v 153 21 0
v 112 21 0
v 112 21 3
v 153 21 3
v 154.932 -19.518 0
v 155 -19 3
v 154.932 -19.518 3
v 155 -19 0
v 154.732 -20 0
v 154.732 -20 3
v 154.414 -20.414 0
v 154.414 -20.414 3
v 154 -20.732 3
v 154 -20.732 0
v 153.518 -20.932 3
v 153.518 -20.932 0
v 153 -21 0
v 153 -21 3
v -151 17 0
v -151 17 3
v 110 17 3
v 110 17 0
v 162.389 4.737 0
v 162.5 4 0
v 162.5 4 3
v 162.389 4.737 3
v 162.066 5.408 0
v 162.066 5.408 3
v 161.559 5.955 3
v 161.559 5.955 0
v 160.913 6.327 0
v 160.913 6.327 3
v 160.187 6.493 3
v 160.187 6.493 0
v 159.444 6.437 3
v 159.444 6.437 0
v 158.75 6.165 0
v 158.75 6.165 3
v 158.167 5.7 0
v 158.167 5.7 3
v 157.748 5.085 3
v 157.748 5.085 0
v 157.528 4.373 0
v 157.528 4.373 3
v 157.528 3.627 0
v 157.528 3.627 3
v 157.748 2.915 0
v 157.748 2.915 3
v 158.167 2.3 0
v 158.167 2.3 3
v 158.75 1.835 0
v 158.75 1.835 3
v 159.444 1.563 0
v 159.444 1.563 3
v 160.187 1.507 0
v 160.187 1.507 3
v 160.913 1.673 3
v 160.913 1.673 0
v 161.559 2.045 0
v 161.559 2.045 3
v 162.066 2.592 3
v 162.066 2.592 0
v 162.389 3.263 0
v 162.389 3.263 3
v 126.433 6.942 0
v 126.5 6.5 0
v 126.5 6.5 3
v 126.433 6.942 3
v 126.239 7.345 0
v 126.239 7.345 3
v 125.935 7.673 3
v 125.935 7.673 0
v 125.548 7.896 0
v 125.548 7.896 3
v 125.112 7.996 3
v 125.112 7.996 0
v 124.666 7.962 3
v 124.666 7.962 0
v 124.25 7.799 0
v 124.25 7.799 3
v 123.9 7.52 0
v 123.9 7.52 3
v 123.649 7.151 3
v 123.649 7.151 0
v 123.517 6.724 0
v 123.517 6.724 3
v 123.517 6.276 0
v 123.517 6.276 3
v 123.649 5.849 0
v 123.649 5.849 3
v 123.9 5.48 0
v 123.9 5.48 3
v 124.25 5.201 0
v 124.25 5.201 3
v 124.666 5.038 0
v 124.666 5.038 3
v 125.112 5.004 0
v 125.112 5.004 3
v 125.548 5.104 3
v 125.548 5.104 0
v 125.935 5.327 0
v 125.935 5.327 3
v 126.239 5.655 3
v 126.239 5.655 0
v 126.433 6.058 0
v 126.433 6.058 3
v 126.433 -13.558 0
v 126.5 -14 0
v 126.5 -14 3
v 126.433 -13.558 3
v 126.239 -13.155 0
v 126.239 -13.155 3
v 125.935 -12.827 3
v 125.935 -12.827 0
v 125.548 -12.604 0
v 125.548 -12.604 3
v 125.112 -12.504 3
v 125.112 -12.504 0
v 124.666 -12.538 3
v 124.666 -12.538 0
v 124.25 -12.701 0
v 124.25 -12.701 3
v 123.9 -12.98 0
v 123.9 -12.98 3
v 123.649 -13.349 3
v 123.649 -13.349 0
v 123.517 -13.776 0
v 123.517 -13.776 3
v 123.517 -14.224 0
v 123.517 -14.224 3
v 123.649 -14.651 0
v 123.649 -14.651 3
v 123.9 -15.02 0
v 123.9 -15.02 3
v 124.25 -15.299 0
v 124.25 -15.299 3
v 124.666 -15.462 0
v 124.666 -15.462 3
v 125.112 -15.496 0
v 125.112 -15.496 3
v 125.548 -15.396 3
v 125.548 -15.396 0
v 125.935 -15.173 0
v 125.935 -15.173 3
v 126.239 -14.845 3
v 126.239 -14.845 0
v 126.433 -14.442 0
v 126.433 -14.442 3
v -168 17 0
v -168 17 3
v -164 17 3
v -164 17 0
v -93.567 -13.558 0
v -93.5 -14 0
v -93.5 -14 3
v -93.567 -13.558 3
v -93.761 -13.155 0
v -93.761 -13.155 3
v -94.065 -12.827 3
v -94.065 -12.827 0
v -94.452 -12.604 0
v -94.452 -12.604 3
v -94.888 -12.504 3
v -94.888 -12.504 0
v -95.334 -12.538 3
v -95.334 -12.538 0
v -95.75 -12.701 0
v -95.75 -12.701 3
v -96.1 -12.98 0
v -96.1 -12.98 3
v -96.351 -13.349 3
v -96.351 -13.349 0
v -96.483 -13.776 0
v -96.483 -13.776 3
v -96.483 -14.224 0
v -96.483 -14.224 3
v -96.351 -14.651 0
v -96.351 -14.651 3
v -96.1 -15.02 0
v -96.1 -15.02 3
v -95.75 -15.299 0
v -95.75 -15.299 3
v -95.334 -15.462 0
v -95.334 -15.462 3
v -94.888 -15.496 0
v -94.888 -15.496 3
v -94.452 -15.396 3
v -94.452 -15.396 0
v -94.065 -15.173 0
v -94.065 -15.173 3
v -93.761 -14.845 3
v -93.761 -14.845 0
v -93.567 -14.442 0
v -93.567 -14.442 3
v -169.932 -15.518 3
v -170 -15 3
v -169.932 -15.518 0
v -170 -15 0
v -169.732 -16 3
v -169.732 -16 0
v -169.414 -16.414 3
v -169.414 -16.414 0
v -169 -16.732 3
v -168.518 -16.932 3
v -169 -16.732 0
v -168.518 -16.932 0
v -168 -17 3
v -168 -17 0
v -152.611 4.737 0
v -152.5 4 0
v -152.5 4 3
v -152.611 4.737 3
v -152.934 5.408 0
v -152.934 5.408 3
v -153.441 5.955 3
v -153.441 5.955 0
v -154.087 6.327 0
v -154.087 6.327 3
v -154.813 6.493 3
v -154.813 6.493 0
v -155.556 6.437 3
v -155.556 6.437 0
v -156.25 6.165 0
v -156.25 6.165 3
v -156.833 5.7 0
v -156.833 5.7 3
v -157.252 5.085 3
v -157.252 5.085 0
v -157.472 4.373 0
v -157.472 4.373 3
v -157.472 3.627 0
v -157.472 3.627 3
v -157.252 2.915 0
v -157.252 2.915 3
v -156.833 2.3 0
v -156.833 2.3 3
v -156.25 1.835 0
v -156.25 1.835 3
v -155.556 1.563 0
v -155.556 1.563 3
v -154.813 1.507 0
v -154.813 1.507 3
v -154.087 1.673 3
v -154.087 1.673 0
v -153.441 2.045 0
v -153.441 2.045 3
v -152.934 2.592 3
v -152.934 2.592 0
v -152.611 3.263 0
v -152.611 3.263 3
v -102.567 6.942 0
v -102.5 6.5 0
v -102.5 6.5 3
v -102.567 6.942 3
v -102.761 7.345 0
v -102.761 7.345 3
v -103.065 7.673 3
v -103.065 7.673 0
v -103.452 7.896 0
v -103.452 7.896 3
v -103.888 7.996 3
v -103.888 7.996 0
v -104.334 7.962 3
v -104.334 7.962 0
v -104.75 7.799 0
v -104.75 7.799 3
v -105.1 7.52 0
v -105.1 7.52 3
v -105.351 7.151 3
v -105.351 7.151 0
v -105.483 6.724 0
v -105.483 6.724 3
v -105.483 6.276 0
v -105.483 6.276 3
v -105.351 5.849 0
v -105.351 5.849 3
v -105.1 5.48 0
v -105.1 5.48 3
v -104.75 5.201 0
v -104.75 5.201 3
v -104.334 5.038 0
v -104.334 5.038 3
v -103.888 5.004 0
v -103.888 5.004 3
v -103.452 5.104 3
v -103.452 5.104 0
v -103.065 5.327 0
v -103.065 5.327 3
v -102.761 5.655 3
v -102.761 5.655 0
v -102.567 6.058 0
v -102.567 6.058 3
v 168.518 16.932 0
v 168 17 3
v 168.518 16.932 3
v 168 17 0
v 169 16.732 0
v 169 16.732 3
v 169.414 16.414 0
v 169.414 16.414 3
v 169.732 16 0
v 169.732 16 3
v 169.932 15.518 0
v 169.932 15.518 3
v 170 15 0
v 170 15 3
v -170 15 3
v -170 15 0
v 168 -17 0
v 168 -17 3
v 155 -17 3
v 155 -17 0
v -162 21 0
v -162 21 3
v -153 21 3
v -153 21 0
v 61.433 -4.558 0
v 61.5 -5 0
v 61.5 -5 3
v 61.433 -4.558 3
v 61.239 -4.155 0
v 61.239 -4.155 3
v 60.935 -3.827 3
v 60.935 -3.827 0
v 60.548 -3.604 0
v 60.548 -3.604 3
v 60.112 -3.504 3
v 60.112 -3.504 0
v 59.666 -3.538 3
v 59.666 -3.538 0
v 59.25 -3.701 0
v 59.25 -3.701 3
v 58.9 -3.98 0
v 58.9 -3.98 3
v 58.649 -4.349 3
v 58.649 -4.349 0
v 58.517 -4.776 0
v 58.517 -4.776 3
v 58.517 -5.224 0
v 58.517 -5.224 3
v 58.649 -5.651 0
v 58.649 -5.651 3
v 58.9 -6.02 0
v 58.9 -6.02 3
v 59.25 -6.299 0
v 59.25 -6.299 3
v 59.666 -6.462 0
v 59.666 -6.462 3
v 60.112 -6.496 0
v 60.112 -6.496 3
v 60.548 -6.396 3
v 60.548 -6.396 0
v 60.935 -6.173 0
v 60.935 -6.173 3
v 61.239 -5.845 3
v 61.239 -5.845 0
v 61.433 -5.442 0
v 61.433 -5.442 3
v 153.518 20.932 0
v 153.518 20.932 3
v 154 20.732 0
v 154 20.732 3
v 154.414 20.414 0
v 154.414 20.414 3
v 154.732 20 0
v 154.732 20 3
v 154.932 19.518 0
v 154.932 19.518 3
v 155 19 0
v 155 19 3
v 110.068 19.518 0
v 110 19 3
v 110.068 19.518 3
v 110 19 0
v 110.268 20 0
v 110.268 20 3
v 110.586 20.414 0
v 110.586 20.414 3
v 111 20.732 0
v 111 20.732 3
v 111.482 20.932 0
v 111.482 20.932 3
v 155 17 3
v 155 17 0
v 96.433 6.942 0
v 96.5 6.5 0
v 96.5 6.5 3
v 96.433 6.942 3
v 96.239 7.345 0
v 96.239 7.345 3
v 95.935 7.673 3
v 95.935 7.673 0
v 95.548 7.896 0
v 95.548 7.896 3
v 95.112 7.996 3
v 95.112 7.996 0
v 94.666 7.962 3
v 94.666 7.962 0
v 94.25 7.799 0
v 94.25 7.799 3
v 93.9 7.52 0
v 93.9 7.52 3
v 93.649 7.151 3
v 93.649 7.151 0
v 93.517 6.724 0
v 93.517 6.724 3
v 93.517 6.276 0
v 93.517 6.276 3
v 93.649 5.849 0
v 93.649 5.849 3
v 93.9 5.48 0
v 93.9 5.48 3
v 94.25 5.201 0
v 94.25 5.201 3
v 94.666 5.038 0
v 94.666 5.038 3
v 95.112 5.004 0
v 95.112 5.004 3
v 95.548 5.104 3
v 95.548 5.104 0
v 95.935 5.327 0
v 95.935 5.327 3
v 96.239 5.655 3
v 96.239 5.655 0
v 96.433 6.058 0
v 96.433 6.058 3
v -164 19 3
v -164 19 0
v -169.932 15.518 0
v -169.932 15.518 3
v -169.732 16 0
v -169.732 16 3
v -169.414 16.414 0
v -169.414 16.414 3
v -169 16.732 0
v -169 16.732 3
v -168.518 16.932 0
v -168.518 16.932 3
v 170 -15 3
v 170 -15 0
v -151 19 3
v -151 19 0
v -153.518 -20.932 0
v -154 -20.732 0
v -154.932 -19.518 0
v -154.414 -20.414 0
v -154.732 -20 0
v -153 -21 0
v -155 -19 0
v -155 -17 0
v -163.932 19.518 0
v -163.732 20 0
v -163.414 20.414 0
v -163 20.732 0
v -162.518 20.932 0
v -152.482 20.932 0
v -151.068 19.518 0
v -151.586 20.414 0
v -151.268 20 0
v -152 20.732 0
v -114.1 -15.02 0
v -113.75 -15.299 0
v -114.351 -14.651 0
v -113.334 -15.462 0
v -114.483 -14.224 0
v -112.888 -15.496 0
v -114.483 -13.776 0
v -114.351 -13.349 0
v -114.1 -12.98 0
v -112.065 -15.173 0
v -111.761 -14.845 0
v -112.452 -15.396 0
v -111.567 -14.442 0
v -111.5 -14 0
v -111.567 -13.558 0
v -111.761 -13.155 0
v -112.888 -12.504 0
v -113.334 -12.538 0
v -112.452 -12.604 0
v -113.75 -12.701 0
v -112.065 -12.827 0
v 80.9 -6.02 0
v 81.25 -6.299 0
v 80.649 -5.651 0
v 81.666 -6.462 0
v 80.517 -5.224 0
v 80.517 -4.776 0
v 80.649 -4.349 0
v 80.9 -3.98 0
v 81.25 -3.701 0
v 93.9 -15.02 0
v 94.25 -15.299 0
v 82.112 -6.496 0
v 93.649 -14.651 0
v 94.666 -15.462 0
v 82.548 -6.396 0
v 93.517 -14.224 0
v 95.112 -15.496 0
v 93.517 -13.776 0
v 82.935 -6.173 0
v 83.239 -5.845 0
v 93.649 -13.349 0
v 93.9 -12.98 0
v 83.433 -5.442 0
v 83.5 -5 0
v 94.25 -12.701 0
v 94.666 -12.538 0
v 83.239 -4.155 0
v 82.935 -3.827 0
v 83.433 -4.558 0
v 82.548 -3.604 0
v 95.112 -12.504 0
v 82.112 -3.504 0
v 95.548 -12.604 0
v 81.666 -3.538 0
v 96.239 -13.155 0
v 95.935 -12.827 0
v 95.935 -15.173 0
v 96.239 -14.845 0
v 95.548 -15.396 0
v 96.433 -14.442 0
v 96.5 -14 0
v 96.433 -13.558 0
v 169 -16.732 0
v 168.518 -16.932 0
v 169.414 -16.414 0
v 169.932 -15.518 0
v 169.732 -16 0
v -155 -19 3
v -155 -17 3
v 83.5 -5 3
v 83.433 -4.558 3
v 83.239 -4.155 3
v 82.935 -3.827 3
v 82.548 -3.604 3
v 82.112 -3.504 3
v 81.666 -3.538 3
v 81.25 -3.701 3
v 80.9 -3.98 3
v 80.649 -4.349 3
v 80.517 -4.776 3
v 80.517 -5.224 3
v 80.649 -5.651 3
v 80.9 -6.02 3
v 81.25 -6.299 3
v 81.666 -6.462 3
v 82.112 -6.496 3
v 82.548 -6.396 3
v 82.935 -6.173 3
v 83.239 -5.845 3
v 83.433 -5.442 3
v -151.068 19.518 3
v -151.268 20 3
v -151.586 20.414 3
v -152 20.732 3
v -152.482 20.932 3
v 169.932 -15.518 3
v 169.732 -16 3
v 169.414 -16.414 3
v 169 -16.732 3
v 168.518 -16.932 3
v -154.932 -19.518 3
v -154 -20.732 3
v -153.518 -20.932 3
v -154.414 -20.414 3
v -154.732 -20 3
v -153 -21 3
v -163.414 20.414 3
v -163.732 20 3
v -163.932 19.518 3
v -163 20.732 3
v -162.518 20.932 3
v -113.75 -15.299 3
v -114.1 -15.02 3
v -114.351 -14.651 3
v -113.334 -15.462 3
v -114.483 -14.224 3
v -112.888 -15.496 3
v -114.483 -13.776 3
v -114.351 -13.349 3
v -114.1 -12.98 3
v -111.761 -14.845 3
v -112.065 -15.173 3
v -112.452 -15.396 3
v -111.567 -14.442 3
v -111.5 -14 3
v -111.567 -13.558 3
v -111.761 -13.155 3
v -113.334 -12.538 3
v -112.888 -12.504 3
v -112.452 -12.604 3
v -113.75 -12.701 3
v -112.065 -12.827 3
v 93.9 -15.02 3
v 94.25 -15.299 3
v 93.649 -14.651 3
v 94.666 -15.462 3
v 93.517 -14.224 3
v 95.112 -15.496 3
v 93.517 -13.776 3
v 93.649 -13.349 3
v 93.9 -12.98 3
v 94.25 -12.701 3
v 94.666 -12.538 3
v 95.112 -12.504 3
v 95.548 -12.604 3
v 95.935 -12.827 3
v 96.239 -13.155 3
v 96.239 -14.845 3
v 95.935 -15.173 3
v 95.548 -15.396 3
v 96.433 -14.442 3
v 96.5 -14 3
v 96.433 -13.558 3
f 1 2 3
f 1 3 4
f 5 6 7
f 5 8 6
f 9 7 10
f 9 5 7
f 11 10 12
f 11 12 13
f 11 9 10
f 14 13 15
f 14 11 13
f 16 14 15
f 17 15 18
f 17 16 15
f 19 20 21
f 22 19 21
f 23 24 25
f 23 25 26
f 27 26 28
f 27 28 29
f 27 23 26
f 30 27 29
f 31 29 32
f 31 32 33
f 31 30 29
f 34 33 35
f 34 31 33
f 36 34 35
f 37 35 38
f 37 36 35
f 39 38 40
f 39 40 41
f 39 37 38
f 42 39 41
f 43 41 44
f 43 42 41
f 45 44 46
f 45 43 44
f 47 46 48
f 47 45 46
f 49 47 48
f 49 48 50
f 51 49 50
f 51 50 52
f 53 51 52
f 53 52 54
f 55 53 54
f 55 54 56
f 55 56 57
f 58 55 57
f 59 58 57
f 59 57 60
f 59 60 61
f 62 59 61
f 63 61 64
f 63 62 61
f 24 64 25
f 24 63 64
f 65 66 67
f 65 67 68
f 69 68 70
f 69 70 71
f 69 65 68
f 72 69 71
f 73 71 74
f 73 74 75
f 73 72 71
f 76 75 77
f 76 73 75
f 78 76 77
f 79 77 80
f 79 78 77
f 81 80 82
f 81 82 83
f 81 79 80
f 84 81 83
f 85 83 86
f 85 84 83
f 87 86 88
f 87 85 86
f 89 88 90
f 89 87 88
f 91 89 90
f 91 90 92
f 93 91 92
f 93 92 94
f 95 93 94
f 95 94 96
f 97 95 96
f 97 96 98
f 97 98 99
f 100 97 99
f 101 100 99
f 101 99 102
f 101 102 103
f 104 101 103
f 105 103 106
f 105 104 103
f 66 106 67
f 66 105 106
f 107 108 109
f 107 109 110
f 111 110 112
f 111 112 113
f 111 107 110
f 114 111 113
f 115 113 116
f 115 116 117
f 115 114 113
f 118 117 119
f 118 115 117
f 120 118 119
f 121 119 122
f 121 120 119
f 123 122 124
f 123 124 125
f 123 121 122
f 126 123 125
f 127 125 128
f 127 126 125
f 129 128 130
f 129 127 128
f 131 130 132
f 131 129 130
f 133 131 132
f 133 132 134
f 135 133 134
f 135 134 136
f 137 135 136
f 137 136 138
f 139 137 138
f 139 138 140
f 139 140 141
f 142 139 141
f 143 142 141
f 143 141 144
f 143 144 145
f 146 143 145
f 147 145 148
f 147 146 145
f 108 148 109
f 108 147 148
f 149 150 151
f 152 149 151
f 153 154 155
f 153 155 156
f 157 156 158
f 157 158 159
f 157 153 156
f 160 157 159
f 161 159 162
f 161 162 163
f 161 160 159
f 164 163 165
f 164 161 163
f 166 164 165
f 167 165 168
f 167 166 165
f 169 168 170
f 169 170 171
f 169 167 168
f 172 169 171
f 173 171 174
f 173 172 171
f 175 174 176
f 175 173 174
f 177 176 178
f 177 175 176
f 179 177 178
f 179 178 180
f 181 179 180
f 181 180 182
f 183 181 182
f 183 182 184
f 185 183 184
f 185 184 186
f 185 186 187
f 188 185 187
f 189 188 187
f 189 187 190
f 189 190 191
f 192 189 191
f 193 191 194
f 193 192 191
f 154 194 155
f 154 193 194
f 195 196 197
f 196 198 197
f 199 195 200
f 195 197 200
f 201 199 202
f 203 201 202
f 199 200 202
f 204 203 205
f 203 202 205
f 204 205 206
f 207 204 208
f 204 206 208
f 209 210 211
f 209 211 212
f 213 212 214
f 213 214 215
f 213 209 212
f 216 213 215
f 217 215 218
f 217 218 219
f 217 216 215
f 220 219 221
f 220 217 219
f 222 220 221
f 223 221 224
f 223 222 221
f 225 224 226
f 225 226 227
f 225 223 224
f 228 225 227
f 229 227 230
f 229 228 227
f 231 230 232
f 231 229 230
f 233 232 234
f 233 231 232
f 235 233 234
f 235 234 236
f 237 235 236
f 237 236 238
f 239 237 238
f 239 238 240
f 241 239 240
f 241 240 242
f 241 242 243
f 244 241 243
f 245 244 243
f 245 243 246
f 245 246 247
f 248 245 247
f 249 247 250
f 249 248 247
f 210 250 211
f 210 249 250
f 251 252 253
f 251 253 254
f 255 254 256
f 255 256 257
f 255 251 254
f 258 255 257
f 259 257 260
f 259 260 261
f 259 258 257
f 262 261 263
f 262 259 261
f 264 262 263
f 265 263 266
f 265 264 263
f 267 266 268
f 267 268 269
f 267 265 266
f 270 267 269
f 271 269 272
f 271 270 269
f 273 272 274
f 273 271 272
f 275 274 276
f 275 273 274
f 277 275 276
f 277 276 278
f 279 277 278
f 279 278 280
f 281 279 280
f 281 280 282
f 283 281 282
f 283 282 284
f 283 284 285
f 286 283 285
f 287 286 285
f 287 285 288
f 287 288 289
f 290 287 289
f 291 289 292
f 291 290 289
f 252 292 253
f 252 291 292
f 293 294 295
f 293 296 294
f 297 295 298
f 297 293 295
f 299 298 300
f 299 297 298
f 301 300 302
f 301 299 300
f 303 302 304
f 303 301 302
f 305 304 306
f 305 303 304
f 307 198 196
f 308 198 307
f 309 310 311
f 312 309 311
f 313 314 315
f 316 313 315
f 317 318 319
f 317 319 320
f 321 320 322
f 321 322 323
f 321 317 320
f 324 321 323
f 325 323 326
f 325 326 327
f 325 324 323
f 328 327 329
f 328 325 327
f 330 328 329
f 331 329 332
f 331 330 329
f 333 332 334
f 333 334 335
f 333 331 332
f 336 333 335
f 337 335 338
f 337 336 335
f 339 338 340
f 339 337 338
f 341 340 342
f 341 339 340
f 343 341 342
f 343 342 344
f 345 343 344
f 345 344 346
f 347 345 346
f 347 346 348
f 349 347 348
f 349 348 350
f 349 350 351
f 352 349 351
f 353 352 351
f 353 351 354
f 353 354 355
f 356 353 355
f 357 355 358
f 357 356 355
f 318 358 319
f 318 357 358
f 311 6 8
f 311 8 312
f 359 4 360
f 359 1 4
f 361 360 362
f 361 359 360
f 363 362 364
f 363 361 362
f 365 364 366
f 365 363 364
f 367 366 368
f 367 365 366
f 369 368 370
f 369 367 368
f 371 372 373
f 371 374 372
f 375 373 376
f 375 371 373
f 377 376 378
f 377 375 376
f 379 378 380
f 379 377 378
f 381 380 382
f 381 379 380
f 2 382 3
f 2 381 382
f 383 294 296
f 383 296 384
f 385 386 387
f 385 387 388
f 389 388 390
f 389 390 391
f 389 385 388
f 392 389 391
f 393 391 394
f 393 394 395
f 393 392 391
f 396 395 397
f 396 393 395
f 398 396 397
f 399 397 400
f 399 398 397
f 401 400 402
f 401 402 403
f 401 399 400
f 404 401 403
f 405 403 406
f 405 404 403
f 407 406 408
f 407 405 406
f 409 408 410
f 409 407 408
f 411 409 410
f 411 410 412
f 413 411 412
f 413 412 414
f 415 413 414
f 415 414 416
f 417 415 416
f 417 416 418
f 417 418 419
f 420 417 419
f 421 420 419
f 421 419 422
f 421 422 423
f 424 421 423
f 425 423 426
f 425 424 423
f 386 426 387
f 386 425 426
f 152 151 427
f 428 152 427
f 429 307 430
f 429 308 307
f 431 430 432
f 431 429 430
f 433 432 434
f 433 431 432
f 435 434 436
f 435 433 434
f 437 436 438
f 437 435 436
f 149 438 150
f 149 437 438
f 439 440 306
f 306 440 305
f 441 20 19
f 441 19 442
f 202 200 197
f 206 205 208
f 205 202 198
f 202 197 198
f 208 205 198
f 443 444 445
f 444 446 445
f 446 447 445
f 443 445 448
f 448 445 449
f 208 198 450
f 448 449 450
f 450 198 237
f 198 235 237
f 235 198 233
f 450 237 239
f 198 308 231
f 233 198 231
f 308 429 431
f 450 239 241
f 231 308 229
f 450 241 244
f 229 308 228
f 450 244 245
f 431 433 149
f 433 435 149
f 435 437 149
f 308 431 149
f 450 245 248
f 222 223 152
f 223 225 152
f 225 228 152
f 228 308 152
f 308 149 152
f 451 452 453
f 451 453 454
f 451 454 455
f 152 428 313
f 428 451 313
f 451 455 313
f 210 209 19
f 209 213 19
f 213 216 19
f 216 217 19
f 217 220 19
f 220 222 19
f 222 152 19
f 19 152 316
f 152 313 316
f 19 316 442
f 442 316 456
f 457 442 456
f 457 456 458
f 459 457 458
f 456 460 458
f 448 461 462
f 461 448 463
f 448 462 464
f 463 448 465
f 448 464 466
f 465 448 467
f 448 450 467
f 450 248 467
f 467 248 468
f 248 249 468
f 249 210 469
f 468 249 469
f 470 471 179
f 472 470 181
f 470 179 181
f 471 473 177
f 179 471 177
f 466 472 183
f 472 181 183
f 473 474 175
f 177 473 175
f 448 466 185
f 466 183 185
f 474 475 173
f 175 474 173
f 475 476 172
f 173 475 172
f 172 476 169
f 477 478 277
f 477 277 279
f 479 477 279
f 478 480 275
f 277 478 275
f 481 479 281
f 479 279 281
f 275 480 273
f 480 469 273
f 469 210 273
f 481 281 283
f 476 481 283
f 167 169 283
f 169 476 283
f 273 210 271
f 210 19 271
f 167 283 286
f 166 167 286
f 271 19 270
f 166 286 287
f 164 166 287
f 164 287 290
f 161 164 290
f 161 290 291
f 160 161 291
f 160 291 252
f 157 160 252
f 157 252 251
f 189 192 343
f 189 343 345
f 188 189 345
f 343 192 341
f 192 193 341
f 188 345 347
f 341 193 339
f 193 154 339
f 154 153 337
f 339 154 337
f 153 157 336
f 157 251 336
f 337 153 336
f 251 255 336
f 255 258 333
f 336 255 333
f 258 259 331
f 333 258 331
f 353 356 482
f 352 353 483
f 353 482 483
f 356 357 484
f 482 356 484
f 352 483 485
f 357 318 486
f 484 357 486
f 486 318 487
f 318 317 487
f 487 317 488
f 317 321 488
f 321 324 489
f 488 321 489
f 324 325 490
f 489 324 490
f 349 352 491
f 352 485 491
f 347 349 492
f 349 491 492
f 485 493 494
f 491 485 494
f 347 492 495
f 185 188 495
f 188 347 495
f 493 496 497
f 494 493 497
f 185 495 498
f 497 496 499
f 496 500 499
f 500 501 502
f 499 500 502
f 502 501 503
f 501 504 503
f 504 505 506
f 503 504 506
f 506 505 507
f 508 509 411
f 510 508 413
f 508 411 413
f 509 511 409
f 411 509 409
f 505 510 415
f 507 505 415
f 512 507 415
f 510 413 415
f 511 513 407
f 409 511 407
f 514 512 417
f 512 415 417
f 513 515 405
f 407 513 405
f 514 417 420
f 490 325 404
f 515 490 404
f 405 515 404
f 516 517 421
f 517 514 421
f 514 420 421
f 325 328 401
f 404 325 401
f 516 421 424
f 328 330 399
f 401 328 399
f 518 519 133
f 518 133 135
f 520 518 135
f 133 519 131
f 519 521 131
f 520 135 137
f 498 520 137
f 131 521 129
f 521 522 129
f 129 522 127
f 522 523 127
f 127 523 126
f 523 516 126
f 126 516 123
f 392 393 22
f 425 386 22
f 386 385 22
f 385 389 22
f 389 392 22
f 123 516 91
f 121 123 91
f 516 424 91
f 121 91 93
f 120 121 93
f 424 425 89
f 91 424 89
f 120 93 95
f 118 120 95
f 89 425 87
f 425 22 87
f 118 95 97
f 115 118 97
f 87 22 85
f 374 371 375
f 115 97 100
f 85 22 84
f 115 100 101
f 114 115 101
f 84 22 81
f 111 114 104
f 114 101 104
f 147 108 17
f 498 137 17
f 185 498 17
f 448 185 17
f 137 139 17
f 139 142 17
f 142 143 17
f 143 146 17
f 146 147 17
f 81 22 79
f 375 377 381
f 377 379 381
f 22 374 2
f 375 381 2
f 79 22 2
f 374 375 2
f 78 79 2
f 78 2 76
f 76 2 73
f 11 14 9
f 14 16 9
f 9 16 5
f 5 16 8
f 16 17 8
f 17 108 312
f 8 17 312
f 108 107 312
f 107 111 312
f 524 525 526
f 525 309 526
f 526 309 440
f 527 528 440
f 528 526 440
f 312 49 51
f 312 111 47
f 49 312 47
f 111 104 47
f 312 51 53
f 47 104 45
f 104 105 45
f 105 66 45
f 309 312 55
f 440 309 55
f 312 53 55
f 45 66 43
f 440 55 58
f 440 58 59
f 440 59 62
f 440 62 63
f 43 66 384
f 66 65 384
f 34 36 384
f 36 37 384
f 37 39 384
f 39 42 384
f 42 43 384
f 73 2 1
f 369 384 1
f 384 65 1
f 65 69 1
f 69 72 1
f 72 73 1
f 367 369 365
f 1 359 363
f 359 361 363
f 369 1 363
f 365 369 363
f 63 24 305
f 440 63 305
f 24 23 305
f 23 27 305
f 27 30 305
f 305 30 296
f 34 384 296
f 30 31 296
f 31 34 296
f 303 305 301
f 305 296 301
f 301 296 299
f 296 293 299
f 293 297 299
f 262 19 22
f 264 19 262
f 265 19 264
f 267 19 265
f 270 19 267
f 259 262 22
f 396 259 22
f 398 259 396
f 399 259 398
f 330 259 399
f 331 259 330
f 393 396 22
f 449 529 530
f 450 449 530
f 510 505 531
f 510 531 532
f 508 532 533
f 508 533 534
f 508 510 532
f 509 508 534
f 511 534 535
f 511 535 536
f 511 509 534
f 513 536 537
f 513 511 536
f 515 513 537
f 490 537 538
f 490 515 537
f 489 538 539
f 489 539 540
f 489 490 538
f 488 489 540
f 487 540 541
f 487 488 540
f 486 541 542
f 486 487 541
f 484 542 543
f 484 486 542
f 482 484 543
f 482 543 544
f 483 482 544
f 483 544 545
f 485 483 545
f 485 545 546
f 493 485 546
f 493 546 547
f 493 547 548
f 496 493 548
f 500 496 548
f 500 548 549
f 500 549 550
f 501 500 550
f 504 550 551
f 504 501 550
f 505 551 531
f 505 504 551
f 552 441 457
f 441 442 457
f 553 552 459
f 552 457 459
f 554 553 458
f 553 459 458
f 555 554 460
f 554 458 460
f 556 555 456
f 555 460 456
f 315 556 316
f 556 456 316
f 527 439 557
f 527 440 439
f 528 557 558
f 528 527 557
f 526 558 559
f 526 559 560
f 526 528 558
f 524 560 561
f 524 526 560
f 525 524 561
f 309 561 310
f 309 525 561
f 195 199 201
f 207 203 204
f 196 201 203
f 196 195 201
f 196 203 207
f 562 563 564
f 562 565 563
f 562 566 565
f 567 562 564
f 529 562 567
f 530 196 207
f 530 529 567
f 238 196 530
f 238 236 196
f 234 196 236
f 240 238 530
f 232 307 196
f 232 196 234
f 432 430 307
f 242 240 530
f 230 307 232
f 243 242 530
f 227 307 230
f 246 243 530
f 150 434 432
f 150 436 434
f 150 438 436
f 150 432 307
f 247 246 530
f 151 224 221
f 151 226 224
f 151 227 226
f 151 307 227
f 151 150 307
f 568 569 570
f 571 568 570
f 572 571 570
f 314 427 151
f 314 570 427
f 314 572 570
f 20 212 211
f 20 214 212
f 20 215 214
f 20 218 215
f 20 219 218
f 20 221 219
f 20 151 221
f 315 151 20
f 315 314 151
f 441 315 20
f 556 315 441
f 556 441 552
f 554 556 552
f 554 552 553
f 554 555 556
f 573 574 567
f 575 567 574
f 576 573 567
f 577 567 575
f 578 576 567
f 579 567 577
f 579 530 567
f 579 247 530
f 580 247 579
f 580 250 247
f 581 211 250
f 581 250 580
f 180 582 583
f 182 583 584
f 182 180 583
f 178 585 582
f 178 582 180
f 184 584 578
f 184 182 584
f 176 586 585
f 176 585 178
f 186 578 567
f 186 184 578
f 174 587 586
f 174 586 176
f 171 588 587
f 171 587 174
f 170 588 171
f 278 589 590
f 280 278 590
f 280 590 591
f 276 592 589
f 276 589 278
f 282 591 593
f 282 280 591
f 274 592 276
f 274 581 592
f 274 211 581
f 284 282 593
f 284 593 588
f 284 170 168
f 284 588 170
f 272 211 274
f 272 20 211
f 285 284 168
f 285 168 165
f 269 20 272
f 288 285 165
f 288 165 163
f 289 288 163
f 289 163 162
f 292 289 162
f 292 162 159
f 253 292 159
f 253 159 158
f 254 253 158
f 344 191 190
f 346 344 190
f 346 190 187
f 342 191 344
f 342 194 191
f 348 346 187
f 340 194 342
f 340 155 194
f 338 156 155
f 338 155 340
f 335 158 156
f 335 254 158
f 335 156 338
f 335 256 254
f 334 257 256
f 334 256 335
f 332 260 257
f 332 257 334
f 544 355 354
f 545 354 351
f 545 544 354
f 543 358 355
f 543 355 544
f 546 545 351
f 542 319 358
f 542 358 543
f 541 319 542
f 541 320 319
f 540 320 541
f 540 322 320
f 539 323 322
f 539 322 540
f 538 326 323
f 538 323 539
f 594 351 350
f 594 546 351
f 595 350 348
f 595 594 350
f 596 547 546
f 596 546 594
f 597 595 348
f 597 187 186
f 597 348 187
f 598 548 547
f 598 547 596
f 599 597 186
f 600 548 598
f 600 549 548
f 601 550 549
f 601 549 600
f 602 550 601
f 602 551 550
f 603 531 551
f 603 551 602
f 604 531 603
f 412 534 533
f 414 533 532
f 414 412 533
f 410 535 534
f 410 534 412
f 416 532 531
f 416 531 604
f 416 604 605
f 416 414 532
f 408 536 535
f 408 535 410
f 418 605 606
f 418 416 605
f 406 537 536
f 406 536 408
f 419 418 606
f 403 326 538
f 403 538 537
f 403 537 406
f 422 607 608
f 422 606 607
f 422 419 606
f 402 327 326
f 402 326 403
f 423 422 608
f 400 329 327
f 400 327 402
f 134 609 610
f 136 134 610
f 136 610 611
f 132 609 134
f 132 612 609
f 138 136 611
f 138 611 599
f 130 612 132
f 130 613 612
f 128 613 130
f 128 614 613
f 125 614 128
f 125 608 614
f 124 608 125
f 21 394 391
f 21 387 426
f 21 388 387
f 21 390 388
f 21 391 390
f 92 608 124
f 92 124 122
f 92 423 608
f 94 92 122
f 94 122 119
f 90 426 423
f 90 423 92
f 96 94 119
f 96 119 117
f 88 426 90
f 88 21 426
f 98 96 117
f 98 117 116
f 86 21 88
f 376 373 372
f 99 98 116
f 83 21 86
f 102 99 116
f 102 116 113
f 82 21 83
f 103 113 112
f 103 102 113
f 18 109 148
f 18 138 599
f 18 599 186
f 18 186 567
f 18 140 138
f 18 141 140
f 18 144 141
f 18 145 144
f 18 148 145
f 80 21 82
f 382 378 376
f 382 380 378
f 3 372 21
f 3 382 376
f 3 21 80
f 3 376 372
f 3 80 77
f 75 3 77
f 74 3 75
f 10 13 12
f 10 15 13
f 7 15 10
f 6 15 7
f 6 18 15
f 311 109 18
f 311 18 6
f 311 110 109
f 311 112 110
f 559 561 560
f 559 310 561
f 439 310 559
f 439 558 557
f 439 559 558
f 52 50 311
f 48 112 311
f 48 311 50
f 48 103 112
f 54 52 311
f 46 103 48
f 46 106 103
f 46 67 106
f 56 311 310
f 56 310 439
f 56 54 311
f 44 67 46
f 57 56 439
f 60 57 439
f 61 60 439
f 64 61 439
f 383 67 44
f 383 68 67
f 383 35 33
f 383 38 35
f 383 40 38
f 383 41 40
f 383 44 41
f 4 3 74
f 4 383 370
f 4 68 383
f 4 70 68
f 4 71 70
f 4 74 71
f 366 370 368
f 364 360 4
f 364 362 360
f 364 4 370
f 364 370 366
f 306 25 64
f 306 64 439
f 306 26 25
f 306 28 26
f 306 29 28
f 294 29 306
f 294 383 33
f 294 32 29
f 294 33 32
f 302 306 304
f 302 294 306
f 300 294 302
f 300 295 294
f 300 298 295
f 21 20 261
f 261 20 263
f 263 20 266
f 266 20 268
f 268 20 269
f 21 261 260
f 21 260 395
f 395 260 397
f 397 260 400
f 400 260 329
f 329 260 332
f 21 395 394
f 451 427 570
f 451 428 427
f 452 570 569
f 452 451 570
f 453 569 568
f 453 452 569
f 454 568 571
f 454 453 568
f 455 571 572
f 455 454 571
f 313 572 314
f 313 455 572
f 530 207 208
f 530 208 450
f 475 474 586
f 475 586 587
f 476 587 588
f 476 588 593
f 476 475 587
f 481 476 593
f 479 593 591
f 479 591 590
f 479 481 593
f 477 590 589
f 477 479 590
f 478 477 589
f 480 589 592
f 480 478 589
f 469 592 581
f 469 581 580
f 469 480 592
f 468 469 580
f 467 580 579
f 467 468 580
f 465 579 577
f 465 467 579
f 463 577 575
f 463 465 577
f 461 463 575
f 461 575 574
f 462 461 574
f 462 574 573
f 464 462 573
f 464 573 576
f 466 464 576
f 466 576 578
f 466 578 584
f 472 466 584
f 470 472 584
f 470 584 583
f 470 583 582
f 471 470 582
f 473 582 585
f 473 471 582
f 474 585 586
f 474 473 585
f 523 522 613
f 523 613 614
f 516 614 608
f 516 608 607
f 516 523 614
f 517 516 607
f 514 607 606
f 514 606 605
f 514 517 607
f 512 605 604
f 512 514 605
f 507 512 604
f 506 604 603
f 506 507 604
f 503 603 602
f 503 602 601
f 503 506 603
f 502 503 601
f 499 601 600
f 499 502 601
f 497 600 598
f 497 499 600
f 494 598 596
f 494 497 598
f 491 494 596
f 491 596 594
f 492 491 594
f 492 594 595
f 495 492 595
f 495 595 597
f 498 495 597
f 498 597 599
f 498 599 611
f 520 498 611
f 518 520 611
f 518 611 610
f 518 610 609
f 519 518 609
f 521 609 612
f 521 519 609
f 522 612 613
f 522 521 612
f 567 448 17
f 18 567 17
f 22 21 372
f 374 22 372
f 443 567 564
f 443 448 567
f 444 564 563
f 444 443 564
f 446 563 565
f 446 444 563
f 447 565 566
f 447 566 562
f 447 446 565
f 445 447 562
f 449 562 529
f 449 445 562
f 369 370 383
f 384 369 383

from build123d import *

# Parameters (mm, degrees)
CROQUIS1_W                                 = 340
CROQUIS1_H                                 = 42
CROQUIS1_R                                 = 2.5
CROQUIS1_R_2                               = 1.5
SALIENTE_EXTRUIR1_DEPTH                    = 3
CROQUIS2_W                                 = 15
CROQUIS2_H                                 = 4
CORTAR_EXTRUIR1_DEPTH                      = 172.31841699
SIMETR_A1_AT_THE_SECOND_PLANE_COPY_1_SKE_W = 15
SIMETR_A1_AT_THE_SECOND_PLANE_COPY_1_SKE_H = 4
SIMETR_A1_AT_THE_SECOND_PLANE_COPY_1_DEPTH = 172.31841699
REDONDEO1_R                                = 2
CROQUIS3_W                                 = 261
CROQUIS3_H                                 = 11.873622062
CORTAR_EXTRUIR2_DEPTH                      = 172.31841699
CROQUIS7_W                                 = 13
CROQUIS7_H                                 = 4
SALIENTE_EXTRUIR3_DEPTH                    = 3
REDONDEO2_R                                = 2


with BuildPart() as part:
    # Croquis1 → Saliente-Extruir1 (new body)
    with BuildSketch(Plane.XY):
        Rectangle(CROQUIS1_W, CROQUIS1_H)
        with Locations((160, 4)):
            Circle(CROQUIS1_R, mode=Mode.SUBTRACT)
        with Locations((95, 6.5)):
            Circle(CROQUIS1_R_2, mode=Mode.SUBTRACT)
        with Locations((125, -14)):
            Circle(CROQUIS1_R_2, mode=Mode.SUBTRACT)
        with Locations((95, -14)):
            Circle(CROQUIS1_R_2, mode=Mode.SUBTRACT)
        with Locations((125, 6.5)):
            Circle(CROQUIS1_R_2, mode=Mode.SUBTRACT)
        with Locations((-113, -14)):
            Circle(CROQUIS1_R_2, mode=Mode.SUBTRACT)
        with Locations((-104, 6.5)):
            Circle(CROQUIS1_R_2, mode=Mode.SUBTRACT)
        with Locations((-95, -14)):
            Circle(CROQUIS1_R_2, mode=Mode.SUBTRACT)
        with Locations((-155, 4)):
            Circle(CROQUIS1_R, mode=Mode.SUBTRACT)
        with Locations((82, -5)):
            Circle(CROQUIS1_R_2, mode=Mode.SUBTRACT)
        with Locations((60, -5)):
            Circle(CROQUIS1_R_2, mode=Mode.SUBTRACT)
    extrude(amount=SALIENTE_EXTRUIR1_DEPTH)

    # Croquis2 → Cortar-Extruir1 (cut, through all)
    with BuildSketch(Plane.XY.offset(3)):
        with Locations((-162.5, -19)):
            Rectangle(CROQUIS2_W, CROQUIS2_H)
    cortar_extruir1 = extrude(amount=-CORTAR_EXTRUIR1_DEPTH, mode=Mode.SUBTRACT)

    # Simetría1: Cortar-Extruir1 across plane
    add(cortar_extruir1.mirror(Plane.ZX), mode=Mode.SUBTRACT)

    # Simetría1 at the second plane: Cortar-Extruir1 across plane
    add(cortar_extruir1.mirror(Plane(origin=(0, 0, 0), x_dir=(0, 0, 1), z_dir=(1, 0, 0))), mode=Mode.SUBTRACT)

    # Simetría1 at the second plane copy 1 ske → Simetría1 at the second plane copy 1 (cut, through all)
    with BuildSketch(Plane(origin=(0, 0, 3), x_dir=(-1, 0, 0), z_dir=(0, 0, 1))):
        with Locations((-162.5, -19)):
            Rectangle(SIMETR_A1_AT_THE_SECOND_PLANE_COPY_1_SKE_W, SIMETR_A1_AT_THE_SECOND_PLANE_COPY_1_SKE_H)
    extrude(amount=-SIMETR_A1_AT_THE_SECOND_PLANE_COPY_1_DEPTH, mode=Mode.SUBTRACT)

    # Redondeo1
    redondeo1_edges = [part.edges().sort_by_distance(p)[0] for p in [
        (170, 17, 1.5),
        (155, 21, 1.5),
        (-170, -17, 1.5),
        (-155, -21, 1.5),
        (170, -17, 1.5),
        (155, -21, 1.5),
        (-170, 17, 1.5),
    ]]
    fillet(redondeo1_edges, radius=REDONDEO1_R)

    # Croquis3 → Cortar-Extruir2 (cut, through all)
    with BuildSketch(Plane.XY.offset(3)):
        with Locations((-20.5, 22.936811031)):
            Rectangle(CROQUIS3_W, CROQUIS3_H)
    extrude(amount=-CORTAR_EXTRUIR2_DEPTH, mode=Mode.SUBTRACT)

    # Croquis7 → Saliente-Extruir3 (add)
    with BuildSketch(Plane.XY.offset(3)):
        with Locations((-157.5, 19)):
            Rectangle(CROQUIS7_W, CROQUIS7_H)
    extrude(amount=-SALIENTE_EXTRUIR3_DEPTH)

    # Redondeo2
    redondeo2_edges = [part.edges().sort_by_distance(p)[0] for p in [
        (110, 21, 1.5),
        (-151, 21, 1.5),
        (-164, 21, 1.5),
    ]]
    fillet(redondeo2_edges, radius=REDONDEO2_R)


solid = part.part
